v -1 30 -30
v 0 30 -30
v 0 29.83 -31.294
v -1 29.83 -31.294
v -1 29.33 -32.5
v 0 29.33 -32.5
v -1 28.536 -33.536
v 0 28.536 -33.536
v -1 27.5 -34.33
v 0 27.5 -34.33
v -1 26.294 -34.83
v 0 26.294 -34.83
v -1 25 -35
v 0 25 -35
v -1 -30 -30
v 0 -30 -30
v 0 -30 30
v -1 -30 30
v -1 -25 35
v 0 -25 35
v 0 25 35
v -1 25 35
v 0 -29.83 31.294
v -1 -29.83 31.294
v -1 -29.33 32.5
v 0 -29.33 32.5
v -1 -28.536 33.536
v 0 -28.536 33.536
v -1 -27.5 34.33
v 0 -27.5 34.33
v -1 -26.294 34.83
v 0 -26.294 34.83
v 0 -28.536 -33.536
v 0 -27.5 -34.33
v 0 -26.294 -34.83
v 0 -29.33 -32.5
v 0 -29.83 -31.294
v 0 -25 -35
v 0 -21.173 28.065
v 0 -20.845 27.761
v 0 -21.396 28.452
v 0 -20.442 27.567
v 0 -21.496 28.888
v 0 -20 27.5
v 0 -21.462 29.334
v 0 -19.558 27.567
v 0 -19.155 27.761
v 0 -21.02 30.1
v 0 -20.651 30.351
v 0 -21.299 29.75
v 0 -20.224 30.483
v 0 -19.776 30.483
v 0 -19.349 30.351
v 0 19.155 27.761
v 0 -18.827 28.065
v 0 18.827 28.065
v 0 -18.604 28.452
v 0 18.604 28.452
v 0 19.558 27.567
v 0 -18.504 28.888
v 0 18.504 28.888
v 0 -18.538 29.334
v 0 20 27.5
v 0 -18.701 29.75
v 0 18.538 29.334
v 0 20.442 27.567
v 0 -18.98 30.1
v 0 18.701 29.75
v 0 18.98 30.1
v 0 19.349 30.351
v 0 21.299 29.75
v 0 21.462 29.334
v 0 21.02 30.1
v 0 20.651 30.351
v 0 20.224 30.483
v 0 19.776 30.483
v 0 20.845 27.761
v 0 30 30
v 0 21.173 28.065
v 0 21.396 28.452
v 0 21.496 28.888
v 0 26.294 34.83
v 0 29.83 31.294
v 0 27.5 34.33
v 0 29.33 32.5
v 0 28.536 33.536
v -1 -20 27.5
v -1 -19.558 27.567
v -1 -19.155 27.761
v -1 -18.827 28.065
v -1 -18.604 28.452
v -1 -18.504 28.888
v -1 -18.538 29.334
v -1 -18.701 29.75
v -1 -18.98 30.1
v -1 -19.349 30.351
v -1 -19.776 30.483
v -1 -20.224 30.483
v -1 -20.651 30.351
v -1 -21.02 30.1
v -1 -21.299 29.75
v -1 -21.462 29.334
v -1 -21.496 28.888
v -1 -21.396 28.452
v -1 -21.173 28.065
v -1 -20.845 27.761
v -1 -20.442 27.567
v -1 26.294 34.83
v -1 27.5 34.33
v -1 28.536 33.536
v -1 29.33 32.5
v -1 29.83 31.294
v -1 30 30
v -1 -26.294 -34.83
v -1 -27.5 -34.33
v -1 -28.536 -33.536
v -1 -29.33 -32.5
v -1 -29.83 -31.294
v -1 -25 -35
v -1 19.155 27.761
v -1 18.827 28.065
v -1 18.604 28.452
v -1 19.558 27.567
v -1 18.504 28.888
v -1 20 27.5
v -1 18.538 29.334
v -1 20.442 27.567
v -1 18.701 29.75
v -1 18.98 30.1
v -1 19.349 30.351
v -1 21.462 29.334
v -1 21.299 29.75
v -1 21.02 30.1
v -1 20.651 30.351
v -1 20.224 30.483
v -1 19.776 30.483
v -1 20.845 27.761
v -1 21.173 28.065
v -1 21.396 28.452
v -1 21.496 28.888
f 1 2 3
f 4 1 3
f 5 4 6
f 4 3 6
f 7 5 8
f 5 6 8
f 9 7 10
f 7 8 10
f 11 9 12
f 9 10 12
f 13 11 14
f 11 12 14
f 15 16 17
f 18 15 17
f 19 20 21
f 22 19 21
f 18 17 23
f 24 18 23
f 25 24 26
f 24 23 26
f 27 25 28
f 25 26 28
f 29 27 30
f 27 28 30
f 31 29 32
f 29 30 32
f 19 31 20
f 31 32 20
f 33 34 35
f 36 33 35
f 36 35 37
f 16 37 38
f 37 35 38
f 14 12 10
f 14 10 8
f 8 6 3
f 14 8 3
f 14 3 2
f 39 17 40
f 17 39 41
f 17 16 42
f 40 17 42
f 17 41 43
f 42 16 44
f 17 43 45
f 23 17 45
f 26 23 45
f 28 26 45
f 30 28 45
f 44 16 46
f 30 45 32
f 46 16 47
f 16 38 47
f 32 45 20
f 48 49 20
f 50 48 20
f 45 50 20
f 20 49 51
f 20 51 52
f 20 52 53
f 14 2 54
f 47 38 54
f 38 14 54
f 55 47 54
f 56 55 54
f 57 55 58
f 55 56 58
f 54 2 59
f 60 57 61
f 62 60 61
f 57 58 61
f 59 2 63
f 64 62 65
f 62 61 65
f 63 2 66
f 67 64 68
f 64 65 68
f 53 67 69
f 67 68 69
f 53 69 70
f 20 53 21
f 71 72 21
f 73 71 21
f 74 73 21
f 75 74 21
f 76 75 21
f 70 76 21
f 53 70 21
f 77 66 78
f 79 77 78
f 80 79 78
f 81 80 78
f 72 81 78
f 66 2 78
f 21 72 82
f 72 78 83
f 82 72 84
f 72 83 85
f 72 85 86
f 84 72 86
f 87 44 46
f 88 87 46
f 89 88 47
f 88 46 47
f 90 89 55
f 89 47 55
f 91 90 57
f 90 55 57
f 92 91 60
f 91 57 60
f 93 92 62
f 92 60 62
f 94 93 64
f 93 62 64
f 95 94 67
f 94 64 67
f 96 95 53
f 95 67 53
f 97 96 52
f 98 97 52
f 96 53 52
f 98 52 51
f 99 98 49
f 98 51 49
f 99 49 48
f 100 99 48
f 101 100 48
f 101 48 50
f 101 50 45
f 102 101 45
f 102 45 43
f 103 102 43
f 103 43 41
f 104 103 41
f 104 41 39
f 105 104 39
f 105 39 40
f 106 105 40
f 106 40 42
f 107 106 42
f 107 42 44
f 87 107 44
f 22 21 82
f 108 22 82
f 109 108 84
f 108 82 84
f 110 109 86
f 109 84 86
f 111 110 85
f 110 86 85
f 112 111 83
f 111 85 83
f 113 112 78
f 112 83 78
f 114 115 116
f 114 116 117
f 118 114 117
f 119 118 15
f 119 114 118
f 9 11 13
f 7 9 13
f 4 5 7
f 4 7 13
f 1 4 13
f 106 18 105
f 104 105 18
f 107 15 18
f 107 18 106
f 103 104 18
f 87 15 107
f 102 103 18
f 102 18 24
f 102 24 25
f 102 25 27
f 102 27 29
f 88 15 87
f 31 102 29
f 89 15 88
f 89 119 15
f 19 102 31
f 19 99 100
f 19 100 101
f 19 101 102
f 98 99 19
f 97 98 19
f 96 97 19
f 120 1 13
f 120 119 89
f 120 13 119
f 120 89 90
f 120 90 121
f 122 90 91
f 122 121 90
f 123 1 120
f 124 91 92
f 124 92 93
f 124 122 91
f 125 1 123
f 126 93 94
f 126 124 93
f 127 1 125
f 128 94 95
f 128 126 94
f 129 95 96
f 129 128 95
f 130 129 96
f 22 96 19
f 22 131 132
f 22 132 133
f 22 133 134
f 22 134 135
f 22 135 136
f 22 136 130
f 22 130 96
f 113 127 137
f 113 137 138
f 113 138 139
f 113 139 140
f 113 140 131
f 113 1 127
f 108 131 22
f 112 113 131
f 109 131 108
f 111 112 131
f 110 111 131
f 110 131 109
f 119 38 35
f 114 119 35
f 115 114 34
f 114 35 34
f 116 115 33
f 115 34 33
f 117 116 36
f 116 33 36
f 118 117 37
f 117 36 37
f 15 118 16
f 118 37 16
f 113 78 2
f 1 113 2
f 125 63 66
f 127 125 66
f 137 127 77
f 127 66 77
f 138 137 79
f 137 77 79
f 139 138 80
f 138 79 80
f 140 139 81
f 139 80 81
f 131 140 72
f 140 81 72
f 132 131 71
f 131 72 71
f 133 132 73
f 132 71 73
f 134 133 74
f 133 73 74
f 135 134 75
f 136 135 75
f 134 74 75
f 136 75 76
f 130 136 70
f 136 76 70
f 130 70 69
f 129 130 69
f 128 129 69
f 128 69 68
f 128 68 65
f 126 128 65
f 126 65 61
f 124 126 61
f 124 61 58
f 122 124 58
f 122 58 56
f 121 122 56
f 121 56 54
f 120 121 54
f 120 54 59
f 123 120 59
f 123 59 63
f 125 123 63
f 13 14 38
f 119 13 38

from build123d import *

# Parameters (mm, degrees)
BOSS_EXTRUDE1_DEPTH = 1
SKETCH2_R           = 1.5
CUT_EXTRUDE1_DEPTH  = 10


with BuildPart() as part:
    # Sketch1 → Boss-Extrude1 (new body)
    with BuildSketch(Plane(origin=(0, 0, 0), x_dir=(0, 0, -1), z_dir=(1, 0, 0))):
        with BuildLine():
            Line((-30, 30), (30, 30))
            ThreePointArc((30, 30), (33.535533906, 28.535533906), (35, 25))
            Line((35, 25), (35, -25))
            ThreePointArc((35, -25), (33.535533906, -28.535533906), (30, -30))
            Line((30, -30), (-30, -30))
            ThreePointArc((-30, -30), (-33.535533906, -28.535533906), (-35, -25))
            Line((-35, -25), (-35, 25))
            ThreePointArc((-35, 25), (-33.535533906, 28.535533906), (-30, 30))
        make_face()
    extrude(amount=-BOSS_EXTRUDE1_DEPTH)

    # Sketch2 → Cut-Extrude1 (cut)
    with BuildSketch(Plane(origin=(0, 0, 0), x_dir=(0, 0, -1), z_dir=(1, 0, 0))):
        with Locations((-29, 20)):
            Circle(SKETCH2_R)
        with Locations((-29, -20)):
            Circle(SKETCH2_R)
    extrude(amount=-CUT_EXTRUDE1_DEPTH, mode=Mode.SUBTRACT)


solid = part.part
